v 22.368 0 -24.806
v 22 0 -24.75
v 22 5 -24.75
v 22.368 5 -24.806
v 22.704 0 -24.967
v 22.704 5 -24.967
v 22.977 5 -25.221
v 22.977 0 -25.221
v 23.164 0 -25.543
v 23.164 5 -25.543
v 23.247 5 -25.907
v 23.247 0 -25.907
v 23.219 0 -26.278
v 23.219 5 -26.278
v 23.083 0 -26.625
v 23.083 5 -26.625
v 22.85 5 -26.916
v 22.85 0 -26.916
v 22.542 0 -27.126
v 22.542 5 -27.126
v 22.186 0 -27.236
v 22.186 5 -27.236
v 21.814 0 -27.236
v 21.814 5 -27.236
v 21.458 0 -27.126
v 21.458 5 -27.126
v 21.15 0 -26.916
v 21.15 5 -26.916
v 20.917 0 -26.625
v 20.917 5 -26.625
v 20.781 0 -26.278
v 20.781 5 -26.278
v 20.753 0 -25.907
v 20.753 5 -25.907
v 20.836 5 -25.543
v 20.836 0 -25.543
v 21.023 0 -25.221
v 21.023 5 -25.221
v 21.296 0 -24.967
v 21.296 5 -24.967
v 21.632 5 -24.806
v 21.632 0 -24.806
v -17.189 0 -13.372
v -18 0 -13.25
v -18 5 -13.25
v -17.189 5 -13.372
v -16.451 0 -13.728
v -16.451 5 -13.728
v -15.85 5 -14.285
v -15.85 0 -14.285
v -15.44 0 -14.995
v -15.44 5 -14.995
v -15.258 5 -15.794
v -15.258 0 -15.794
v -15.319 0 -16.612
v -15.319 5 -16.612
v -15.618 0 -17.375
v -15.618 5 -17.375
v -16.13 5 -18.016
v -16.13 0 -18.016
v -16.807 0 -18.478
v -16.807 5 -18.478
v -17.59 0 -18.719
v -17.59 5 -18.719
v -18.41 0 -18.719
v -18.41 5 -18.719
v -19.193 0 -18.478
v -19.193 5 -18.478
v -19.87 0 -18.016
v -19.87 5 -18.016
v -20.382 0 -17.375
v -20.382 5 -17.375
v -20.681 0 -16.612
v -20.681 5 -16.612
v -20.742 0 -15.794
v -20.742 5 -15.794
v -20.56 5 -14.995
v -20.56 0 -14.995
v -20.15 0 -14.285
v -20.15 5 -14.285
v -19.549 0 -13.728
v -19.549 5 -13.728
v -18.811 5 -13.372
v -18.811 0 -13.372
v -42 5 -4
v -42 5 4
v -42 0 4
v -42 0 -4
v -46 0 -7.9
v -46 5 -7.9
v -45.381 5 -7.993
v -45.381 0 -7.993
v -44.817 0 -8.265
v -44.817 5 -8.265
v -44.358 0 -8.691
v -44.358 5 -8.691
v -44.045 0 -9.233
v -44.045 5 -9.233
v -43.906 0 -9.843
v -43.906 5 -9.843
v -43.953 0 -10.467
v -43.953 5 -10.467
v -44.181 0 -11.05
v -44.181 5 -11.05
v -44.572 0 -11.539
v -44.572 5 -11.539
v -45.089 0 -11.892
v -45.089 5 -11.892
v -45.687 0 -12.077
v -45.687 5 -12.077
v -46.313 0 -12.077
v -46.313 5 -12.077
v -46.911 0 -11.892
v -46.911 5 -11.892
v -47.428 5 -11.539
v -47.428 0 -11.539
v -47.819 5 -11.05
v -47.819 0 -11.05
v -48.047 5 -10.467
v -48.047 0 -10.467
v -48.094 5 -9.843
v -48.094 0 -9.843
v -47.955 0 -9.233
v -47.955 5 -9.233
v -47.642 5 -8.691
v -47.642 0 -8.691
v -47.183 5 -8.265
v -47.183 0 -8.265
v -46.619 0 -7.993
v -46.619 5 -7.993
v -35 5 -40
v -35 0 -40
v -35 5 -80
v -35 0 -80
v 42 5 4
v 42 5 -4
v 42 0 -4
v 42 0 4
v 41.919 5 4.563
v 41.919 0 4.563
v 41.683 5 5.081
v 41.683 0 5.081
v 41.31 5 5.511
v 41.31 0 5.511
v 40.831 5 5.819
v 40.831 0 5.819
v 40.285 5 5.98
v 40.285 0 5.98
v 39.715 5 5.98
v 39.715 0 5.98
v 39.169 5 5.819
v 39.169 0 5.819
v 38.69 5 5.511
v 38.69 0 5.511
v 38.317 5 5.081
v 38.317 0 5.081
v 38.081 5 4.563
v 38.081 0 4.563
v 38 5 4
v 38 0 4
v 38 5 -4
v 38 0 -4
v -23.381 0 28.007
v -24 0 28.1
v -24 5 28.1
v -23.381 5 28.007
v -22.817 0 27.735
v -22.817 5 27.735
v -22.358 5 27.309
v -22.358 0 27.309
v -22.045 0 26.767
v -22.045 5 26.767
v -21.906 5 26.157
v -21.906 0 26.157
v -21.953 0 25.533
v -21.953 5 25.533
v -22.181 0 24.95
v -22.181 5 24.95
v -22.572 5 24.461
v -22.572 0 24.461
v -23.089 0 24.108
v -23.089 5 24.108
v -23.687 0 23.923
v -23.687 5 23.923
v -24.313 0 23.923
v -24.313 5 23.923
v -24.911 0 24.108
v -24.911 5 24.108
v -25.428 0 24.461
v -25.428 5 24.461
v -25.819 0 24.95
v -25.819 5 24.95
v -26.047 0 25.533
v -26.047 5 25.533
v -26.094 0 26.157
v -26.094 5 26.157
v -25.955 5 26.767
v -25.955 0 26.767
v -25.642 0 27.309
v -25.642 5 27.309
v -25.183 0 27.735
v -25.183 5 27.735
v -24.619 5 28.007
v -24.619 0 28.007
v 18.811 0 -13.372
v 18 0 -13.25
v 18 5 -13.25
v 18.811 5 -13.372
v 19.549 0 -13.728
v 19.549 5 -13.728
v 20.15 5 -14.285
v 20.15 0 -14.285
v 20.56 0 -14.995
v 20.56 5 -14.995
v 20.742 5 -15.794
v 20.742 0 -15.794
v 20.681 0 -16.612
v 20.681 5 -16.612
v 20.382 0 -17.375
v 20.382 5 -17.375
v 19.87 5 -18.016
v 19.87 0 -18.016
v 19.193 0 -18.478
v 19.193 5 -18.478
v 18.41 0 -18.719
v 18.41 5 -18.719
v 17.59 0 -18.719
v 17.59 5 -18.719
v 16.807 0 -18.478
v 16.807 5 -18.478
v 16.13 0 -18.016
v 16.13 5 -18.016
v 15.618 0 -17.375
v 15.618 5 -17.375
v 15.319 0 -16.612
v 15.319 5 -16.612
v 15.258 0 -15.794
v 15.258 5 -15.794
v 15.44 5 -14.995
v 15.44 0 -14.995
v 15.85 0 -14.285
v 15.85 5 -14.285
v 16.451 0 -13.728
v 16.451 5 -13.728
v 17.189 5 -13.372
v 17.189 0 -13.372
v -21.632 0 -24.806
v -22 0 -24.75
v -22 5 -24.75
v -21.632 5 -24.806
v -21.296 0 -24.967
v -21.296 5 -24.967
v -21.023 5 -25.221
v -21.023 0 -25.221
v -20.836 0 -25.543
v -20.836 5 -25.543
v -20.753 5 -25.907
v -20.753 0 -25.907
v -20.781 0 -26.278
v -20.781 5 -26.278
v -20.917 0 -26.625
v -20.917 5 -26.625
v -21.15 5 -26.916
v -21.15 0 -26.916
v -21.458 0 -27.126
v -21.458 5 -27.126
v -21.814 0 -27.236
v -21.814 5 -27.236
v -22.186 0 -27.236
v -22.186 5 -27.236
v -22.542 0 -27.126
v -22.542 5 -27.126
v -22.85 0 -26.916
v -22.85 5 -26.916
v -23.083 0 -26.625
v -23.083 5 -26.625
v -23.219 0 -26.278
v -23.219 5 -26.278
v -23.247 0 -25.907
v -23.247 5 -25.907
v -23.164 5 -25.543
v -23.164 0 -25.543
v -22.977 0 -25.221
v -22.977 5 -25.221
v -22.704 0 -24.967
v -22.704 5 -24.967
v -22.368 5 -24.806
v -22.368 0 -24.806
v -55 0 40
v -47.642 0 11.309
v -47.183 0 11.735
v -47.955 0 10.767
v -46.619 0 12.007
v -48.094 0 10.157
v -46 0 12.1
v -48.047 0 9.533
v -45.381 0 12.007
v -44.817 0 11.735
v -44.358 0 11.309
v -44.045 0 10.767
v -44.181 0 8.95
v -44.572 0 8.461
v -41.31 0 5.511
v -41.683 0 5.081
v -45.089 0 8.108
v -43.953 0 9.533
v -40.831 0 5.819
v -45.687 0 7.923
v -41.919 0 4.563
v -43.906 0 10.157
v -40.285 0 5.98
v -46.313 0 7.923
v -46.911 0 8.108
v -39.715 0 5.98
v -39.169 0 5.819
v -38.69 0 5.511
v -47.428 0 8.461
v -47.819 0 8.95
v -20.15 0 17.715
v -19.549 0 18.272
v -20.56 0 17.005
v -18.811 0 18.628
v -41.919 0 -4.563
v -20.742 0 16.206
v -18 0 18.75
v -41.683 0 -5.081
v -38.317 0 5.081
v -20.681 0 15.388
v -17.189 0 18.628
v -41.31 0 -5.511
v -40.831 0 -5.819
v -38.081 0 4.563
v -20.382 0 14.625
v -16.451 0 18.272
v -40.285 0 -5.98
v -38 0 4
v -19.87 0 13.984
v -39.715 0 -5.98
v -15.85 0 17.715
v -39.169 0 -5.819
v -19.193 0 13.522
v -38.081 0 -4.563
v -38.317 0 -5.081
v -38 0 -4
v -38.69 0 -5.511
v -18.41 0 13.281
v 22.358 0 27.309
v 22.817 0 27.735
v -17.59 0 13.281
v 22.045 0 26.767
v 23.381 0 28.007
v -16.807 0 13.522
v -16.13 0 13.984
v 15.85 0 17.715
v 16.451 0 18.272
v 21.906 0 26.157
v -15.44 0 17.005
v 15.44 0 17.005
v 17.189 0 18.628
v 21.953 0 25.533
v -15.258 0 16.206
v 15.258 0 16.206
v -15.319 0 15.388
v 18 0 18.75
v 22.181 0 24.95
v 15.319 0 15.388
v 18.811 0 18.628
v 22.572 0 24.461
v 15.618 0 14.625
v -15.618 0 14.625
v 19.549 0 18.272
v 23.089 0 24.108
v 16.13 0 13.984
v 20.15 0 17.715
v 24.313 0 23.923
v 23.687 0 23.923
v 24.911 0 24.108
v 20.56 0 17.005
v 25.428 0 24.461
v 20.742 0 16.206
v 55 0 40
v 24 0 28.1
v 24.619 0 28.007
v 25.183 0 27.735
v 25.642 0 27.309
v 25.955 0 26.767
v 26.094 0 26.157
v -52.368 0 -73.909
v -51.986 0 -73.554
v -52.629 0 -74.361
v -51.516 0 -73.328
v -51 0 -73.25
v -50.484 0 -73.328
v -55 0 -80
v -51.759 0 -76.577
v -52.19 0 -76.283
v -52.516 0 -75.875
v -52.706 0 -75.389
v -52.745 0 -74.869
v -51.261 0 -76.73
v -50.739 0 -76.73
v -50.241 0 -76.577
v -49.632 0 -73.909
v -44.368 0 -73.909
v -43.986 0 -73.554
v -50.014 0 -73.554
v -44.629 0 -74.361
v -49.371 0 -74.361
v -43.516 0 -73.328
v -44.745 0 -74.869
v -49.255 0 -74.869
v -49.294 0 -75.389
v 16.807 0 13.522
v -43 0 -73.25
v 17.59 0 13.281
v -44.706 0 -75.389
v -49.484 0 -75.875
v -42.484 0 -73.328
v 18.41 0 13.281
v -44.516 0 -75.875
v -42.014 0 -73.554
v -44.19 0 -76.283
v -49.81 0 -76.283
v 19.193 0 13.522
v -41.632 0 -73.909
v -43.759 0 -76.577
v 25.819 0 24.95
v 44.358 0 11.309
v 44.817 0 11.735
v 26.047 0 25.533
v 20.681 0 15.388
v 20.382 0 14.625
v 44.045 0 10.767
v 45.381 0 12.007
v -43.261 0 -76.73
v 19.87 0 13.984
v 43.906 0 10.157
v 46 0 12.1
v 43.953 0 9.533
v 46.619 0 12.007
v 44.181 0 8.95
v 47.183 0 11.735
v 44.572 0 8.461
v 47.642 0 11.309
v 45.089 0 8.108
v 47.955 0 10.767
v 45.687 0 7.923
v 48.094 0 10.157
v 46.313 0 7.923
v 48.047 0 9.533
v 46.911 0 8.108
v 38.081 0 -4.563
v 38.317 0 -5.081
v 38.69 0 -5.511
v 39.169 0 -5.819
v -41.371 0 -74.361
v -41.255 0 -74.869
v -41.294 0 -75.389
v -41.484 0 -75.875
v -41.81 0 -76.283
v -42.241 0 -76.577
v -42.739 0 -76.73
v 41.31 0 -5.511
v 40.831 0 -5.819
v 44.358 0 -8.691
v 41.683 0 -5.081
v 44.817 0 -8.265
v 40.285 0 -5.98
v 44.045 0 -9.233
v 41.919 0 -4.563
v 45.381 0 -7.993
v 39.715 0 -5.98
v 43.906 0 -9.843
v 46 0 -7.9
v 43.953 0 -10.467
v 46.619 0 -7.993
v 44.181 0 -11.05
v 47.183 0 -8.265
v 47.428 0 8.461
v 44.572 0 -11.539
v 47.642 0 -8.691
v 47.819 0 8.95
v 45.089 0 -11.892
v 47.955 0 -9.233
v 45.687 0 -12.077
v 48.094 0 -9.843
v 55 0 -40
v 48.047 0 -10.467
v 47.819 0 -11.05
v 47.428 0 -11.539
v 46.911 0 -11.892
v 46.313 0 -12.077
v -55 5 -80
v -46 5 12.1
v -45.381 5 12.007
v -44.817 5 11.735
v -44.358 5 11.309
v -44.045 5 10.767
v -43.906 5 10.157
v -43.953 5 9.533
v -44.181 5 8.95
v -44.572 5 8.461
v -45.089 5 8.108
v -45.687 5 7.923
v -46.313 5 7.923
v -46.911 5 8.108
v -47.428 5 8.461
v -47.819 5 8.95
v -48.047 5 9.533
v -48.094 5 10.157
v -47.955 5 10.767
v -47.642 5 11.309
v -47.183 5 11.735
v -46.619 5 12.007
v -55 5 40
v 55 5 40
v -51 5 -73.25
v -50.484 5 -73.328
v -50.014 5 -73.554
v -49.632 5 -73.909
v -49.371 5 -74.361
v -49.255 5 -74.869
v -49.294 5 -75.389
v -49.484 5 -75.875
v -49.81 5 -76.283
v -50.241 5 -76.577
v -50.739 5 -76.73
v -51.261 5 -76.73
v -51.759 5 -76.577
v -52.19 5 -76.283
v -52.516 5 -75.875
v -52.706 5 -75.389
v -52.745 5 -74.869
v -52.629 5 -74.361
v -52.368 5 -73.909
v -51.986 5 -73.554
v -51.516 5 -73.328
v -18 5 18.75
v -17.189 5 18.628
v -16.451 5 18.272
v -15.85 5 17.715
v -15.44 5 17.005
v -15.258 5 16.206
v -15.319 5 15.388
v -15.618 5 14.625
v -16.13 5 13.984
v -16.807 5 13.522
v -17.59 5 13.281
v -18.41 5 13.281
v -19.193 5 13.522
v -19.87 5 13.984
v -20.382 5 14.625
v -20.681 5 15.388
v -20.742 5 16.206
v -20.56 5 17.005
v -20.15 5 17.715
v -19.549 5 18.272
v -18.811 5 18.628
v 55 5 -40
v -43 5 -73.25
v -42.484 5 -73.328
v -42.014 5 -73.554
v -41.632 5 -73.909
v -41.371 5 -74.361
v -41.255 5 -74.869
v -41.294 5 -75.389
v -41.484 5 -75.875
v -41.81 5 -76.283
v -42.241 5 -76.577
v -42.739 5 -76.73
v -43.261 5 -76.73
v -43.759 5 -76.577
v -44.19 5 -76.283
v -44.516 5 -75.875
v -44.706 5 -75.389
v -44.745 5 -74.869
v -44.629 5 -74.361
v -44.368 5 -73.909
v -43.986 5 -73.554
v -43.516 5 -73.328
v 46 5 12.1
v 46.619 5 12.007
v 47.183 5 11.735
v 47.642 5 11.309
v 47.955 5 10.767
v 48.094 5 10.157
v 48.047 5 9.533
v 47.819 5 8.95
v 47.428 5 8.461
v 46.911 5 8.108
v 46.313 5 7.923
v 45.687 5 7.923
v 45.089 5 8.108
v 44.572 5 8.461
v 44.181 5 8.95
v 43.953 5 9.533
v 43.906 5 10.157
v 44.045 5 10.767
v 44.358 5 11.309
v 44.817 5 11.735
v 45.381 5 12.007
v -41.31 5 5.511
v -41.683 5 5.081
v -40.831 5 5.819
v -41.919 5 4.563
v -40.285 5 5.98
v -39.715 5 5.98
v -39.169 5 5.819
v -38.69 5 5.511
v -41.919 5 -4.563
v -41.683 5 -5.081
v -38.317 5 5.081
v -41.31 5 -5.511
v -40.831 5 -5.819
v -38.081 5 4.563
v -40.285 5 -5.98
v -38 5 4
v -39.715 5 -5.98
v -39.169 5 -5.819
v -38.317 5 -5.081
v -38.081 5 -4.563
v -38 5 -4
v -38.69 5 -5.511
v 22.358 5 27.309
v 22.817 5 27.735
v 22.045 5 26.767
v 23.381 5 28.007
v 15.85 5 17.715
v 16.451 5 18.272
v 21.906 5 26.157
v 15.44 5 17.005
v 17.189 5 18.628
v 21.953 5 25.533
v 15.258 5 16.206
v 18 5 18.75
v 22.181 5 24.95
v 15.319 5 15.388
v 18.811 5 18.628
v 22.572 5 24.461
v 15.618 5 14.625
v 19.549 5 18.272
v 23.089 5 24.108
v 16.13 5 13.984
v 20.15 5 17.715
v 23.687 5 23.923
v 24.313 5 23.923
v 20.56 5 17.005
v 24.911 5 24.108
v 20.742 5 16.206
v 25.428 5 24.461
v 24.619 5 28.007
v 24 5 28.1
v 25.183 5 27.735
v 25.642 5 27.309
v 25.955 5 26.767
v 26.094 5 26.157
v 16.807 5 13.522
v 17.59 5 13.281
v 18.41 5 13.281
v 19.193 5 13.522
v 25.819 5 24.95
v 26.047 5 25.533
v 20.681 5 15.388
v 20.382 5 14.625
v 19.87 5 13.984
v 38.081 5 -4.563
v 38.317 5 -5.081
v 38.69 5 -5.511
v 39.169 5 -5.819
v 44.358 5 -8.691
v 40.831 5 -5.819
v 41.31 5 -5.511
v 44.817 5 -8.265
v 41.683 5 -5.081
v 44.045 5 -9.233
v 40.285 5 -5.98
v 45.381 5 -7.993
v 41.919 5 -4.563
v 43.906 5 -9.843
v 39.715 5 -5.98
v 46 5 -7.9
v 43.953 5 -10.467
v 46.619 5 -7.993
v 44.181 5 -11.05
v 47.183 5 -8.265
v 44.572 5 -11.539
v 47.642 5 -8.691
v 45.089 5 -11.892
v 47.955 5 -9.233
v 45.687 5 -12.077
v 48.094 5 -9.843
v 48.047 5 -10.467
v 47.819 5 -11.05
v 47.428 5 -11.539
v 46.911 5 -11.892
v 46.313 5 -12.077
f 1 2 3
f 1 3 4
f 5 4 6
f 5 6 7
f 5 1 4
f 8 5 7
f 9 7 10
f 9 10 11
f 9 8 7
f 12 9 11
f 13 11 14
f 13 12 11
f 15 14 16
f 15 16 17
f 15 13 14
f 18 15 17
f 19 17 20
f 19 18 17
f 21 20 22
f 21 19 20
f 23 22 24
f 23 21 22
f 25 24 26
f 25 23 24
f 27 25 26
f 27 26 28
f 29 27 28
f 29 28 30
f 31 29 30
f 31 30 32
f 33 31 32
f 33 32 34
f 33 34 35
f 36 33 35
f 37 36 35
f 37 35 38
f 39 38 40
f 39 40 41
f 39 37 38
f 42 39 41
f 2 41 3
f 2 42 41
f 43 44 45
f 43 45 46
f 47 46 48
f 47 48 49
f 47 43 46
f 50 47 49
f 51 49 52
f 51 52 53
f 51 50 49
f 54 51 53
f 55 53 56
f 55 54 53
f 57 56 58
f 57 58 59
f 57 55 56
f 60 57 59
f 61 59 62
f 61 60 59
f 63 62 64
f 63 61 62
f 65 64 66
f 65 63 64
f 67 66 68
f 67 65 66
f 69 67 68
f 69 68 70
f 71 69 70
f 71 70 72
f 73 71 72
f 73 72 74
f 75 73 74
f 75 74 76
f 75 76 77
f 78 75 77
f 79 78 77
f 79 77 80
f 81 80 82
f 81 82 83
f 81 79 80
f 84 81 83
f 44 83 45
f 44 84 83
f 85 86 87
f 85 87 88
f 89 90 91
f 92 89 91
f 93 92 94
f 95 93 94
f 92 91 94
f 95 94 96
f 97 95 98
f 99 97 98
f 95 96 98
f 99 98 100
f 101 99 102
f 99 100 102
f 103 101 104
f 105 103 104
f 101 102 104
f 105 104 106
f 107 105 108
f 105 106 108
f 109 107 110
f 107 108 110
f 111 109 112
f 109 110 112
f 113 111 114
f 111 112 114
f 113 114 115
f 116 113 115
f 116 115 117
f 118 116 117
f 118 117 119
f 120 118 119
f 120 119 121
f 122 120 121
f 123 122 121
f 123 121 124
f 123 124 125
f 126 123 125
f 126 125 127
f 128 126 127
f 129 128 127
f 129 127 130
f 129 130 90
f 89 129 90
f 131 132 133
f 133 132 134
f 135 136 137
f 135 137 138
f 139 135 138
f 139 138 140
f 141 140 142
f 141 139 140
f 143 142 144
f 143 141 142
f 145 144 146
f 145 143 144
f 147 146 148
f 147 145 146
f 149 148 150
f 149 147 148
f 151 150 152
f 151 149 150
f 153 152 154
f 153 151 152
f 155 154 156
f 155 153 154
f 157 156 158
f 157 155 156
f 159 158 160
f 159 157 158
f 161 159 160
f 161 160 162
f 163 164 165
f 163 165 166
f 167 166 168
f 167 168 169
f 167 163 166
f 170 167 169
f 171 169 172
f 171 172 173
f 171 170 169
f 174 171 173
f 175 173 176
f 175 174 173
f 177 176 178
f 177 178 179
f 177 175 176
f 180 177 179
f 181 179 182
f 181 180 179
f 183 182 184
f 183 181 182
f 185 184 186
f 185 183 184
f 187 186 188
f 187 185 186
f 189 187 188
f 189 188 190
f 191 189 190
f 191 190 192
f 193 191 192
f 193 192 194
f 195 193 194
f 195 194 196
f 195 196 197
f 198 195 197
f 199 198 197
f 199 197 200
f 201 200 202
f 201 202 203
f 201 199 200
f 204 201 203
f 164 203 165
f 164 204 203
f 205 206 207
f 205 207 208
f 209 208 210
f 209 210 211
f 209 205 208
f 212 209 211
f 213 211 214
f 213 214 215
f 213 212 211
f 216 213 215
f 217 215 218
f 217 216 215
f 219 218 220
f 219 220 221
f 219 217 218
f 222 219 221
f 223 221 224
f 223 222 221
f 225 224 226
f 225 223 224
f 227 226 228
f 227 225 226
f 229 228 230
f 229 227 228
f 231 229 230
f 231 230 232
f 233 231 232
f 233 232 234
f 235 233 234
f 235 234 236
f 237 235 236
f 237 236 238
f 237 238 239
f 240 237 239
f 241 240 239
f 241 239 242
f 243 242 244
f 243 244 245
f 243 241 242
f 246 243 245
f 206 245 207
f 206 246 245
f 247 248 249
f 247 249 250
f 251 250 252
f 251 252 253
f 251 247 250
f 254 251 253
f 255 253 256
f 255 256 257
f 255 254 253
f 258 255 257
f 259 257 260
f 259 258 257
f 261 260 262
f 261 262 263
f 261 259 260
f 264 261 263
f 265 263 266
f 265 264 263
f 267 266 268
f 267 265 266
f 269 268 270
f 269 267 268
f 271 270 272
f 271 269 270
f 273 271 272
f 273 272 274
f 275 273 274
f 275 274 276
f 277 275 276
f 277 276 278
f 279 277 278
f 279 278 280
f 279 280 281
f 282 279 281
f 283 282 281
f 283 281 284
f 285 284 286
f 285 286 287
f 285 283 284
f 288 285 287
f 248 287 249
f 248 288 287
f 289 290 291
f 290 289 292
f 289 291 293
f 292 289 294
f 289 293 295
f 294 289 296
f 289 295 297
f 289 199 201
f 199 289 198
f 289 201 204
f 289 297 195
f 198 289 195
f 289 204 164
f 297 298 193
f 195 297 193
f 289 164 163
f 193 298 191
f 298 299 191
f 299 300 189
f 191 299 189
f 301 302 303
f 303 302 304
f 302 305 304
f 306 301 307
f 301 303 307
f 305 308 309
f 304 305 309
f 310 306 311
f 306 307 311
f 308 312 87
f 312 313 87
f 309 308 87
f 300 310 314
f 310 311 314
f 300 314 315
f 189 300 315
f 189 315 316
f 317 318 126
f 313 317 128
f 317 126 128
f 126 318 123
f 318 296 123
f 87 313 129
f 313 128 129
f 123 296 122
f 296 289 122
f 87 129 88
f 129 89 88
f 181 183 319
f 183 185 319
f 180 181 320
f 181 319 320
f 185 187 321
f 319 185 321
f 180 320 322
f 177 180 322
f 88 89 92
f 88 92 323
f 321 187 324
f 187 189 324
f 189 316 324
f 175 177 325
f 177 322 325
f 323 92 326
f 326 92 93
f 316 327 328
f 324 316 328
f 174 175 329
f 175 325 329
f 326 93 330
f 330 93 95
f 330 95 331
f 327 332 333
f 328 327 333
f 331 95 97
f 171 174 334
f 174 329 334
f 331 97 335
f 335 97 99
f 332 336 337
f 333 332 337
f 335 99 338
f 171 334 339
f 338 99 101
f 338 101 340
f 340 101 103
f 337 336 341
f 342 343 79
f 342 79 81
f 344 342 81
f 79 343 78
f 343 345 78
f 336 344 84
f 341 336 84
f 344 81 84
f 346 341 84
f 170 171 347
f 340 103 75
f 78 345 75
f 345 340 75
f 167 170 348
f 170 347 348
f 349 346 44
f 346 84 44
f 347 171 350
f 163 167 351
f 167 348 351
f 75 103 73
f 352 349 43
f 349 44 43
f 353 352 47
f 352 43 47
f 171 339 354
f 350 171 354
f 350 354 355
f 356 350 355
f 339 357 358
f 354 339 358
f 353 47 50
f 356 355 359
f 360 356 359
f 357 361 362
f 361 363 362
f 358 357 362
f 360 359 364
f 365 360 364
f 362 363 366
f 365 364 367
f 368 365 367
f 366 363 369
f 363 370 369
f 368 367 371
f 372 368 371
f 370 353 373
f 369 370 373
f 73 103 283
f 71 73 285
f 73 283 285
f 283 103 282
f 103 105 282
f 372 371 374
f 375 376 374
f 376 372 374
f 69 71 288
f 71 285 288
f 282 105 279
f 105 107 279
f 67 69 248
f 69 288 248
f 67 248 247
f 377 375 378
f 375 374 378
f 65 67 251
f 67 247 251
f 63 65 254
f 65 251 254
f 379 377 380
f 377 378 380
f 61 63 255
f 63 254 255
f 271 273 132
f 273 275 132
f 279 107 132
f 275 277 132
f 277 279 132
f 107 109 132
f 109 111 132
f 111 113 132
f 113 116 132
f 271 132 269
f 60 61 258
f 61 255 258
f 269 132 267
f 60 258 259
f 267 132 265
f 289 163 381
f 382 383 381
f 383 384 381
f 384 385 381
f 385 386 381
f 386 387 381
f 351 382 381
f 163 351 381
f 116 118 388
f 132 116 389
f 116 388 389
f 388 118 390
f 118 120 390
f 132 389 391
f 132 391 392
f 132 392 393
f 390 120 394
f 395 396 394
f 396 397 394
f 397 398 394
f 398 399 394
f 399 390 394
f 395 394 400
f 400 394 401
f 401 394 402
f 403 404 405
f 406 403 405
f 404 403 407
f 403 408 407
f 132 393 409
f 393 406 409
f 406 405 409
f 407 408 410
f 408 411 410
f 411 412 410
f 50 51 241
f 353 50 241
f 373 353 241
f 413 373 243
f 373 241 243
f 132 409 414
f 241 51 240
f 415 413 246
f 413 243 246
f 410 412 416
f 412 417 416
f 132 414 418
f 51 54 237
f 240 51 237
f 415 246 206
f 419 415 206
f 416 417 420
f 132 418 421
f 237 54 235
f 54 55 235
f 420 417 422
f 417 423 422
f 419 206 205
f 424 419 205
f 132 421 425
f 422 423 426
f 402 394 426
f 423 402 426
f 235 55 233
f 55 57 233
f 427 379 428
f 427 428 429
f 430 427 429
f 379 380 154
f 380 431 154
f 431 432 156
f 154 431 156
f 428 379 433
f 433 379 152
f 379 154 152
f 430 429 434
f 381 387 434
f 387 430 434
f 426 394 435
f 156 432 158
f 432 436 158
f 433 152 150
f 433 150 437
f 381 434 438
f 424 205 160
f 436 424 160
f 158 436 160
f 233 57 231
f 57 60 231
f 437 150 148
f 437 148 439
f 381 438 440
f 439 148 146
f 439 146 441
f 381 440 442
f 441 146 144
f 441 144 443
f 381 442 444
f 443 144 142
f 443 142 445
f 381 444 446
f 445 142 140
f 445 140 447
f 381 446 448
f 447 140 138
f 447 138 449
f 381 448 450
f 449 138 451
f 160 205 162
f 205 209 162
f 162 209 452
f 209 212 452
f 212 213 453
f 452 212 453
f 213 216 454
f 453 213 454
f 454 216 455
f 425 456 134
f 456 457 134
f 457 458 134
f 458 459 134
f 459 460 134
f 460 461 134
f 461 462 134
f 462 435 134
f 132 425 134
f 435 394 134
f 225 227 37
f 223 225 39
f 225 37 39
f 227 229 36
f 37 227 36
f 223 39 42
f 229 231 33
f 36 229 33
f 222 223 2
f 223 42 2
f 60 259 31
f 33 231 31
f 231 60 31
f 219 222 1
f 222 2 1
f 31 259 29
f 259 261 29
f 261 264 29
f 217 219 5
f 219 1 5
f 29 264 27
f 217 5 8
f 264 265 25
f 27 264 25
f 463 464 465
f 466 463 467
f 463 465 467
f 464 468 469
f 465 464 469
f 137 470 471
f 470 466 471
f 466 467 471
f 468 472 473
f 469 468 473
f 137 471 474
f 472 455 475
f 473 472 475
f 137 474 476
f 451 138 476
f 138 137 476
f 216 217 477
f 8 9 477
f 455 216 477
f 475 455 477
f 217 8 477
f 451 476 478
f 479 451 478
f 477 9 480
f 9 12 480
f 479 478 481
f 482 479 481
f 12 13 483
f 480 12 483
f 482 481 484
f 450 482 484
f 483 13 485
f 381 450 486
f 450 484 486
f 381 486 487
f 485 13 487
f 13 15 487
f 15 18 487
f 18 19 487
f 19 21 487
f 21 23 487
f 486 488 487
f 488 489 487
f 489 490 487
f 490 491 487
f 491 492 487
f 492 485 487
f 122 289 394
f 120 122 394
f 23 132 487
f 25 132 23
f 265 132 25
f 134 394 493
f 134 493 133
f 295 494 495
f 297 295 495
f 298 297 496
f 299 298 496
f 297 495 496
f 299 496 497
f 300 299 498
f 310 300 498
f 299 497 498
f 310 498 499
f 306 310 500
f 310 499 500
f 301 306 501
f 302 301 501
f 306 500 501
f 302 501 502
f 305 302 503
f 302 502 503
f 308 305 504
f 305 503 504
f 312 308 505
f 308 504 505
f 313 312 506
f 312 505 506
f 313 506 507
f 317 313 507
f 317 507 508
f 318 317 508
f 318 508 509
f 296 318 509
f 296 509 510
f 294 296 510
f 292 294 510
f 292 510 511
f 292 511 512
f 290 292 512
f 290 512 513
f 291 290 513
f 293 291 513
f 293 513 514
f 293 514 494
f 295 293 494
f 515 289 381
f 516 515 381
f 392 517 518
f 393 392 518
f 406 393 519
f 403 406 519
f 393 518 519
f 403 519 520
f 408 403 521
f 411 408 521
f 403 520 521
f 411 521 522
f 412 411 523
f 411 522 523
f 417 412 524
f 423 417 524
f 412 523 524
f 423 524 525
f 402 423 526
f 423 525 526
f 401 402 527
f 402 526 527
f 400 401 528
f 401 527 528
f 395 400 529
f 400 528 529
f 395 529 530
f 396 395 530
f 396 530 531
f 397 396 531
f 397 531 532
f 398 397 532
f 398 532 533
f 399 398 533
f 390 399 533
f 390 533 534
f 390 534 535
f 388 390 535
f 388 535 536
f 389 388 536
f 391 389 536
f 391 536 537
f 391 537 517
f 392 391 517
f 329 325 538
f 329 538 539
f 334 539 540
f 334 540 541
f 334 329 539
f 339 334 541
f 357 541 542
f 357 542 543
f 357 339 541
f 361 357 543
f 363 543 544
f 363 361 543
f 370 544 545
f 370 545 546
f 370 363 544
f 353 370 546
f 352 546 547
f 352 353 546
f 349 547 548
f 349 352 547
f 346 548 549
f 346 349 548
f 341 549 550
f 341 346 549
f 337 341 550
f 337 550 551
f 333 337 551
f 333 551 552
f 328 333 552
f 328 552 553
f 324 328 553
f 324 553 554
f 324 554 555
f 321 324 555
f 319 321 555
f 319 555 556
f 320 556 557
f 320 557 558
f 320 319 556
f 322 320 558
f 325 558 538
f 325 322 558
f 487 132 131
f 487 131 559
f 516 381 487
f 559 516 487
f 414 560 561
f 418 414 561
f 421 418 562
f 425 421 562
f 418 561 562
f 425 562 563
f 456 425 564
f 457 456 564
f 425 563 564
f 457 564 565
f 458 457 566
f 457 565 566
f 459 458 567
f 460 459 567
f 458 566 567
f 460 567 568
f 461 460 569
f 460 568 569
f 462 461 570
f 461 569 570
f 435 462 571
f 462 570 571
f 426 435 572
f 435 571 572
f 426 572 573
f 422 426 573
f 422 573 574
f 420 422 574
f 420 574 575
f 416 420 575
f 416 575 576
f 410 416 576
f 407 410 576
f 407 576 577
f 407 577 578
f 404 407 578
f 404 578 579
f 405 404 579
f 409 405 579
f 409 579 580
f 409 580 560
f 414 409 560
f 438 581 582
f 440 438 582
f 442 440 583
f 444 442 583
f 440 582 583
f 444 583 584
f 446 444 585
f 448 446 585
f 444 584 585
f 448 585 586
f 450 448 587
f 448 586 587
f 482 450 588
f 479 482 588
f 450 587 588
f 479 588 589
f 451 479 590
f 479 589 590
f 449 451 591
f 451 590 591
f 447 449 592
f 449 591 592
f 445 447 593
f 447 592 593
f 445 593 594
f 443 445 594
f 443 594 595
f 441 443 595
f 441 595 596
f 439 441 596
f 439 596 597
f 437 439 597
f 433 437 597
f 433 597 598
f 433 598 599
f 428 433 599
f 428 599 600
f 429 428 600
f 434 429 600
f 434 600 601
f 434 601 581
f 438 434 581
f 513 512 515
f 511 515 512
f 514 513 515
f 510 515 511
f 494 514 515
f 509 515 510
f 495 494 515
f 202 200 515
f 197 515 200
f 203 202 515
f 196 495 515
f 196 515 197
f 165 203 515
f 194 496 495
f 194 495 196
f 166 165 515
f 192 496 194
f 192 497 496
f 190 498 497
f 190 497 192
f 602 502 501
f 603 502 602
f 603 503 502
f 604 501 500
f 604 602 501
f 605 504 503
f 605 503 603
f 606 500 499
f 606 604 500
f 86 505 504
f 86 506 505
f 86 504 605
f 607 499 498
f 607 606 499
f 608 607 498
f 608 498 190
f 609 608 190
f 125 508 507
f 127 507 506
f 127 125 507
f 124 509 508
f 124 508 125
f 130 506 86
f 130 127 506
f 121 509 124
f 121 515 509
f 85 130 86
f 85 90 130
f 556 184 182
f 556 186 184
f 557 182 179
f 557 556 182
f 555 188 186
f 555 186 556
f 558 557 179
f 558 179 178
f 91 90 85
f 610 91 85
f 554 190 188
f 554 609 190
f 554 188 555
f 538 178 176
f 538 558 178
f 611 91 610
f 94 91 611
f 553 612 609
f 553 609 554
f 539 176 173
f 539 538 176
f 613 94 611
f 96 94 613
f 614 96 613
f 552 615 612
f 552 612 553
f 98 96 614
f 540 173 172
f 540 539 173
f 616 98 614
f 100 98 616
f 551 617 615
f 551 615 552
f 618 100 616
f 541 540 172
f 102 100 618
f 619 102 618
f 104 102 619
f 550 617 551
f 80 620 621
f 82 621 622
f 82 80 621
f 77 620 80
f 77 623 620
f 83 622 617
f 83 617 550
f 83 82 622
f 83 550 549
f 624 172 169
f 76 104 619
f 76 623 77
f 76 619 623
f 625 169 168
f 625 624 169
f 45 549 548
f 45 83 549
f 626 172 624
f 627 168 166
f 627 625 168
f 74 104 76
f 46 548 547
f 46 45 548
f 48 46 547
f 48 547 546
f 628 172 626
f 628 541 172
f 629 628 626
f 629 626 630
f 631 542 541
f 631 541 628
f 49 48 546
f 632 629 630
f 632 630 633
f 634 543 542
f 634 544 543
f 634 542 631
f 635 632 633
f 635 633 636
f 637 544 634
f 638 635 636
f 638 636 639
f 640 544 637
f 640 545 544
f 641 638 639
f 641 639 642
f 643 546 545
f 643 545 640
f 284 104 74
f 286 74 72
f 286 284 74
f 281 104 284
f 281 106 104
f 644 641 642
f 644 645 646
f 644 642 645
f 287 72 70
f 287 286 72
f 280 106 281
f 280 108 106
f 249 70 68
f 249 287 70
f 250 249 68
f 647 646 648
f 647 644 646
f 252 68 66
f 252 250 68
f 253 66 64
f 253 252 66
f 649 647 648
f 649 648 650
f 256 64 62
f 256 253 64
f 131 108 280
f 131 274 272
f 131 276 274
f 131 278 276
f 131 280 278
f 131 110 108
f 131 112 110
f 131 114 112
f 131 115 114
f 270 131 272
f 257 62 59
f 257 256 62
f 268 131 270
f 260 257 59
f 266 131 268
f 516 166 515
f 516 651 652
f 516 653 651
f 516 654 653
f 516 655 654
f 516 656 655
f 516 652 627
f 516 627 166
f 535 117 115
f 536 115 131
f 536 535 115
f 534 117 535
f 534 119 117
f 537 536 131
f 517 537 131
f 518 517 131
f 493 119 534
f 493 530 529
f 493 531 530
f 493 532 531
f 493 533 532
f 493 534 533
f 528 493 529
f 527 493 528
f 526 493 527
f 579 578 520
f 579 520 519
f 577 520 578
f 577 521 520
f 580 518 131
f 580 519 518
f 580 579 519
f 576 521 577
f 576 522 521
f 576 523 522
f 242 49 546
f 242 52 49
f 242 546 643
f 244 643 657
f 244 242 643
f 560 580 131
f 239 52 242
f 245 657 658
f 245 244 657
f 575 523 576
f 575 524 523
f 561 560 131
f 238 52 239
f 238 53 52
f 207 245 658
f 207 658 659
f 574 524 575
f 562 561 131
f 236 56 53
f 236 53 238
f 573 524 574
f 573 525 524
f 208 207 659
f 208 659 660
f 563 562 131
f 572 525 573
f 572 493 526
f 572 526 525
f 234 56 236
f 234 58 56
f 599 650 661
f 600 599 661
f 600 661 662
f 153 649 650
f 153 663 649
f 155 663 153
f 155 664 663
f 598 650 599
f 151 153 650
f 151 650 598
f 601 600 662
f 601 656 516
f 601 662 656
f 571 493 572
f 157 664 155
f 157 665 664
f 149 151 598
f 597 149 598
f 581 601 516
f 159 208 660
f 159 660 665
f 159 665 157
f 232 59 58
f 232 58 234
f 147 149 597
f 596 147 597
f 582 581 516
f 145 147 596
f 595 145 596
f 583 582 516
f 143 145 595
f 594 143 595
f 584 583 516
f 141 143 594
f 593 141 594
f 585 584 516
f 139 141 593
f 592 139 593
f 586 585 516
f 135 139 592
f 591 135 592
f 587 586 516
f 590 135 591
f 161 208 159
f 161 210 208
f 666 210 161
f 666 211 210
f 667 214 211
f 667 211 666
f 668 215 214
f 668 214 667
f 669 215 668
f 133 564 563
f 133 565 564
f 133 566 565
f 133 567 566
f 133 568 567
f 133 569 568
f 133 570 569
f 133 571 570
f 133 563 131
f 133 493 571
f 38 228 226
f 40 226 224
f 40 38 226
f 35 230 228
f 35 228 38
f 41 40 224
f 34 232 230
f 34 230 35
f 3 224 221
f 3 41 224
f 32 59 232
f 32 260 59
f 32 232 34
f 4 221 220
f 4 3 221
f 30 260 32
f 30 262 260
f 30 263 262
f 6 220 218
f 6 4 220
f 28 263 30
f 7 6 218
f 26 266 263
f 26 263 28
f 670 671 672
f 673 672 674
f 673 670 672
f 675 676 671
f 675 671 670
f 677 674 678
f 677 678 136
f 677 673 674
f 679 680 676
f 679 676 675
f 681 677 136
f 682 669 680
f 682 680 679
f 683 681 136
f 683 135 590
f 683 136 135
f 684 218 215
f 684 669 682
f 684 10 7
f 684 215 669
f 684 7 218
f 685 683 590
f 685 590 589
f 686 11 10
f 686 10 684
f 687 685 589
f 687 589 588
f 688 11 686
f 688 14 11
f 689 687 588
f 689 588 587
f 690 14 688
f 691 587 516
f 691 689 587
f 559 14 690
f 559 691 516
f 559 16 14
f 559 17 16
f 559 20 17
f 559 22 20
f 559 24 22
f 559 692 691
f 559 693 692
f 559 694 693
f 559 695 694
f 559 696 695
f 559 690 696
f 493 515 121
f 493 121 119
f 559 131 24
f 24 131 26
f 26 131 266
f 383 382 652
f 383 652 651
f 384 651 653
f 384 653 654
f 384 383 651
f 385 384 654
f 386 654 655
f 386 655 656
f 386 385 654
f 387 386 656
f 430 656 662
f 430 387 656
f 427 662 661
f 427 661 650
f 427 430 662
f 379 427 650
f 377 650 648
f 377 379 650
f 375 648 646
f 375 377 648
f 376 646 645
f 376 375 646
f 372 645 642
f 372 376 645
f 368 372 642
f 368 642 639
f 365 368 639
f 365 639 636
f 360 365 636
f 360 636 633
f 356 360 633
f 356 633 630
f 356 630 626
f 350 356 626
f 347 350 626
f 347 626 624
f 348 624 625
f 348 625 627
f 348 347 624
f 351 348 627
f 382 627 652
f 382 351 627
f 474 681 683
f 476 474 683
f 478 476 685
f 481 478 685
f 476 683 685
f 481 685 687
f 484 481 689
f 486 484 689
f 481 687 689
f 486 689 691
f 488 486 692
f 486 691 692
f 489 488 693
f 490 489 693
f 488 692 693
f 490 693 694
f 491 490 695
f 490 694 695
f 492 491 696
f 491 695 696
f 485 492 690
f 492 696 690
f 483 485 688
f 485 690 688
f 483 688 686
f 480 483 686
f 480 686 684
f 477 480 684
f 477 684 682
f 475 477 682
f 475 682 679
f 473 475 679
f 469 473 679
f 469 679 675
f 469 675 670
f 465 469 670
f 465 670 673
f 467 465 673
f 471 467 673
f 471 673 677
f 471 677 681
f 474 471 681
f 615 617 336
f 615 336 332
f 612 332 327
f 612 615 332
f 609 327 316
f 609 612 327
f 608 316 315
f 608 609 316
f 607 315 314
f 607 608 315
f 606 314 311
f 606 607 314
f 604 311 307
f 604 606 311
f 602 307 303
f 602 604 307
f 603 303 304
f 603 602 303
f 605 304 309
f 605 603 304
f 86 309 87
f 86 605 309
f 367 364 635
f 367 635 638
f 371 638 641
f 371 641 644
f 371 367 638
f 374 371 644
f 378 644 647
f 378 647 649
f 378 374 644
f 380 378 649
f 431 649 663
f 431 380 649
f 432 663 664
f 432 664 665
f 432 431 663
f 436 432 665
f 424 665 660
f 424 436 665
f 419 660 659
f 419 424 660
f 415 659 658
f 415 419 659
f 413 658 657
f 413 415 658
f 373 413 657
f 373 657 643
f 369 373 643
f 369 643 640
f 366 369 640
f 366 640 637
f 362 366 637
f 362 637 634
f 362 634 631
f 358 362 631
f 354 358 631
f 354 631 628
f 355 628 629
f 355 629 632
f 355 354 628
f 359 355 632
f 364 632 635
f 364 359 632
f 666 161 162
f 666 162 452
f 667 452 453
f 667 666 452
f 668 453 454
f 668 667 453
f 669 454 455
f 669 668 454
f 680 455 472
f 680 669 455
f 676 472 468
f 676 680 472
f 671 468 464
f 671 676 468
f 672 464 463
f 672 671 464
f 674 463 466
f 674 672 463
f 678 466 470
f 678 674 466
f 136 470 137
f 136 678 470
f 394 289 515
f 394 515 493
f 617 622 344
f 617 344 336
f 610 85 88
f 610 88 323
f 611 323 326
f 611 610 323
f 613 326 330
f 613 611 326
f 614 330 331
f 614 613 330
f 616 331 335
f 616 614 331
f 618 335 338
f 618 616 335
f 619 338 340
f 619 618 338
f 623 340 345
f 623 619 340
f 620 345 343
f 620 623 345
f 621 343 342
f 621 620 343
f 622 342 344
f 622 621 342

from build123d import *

# Parameters (mm, degrees)
SKETCH1_W           = 110
SKETCH1_H           = 80
SKETCH1_R           = 2.75
SKETCH1_R_2         = 1.25
SKETCH1_R_3         = 2.1
BOSS_EXTRUDE1_DEPTH = 5
SKETCH2_R           = 2.1
CUT_EXTRUDE1_DEPTH  = 69.190908485
SKETCH7_W           = 20
SKETCH7_H           = 40
BOSS_EXTRUDE2_DEPTH = 5
CUT_EXTRUDE2_REACH  = 99.211
SKETCH8_R           = 1.75


with BuildPart() as part:
    # Sketch1 → Boss-Extrude1 (new body)
    with BuildSketch(Plane(origin=(0, 0, 0), x_dir=(1, 0, 0), z_dir=(0, 1, 0))):
        Rectangle(SKETCH1_W, SKETCH1_H)
        with Locations(Location((-18, 16, 0), (0, 0, 270))):
            Circle(SKETCH1_R, mode=Mode.SUBTRACT)
        with Locations(Location((18, 16, 0), (0, 0, 270))):
            Circle(SKETCH1_R, mode=Mode.SUBTRACT)
        with Locations(Location((18, -16, 0), (0, 0, 270))):
            Circle(SKETCH1_R, mode=Mode.SUBTRACT)
        with Locations(Location((-18, -16, 0), (0, 0, 270))):
            Circle(SKETCH1_R, mode=Mode.SUBTRACT)
        with Locations(Location((-22, 26, 0), (0, 0, 270))):
            Circle(SKETCH1_R_2, mode=Mode.SUBTRACT)
        with Locations(Location((22, 26, 0), (0, 0, 270))):
            Circle(SKETCH1_R_2, mode=Mode.SUBTRACT)
        with Locations(Location((-24, -26, 0), (0, 0, 270))):
            Circle(SKETCH1_R_3, mode=Mode.SUBTRACT)
        with Locations(Location((24, -26, 0), (0, 0, 270))):
            Circle(SKETCH1_R_3, mode=Mode.SUBTRACT)
    extrude(amount=BOSS_EXTRUDE1_DEPTH)

    # Sketch2 → Cut-Extrude1 (cut, through all)
    with BuildSketch(Plane(origin=(0, 5, 0), x_dir=(1, 0, 0), z_dir=(0, 1, 0))):
        with Locations(Location((-46, 10, 0), (0, 0, 270))):
            Circle(SKETCH2_R)
        with Locations(Location((-46, -10, 0), (0, 0, 270))):
            Circle(SKETCH2_R)
        with Locations(Location((46, -10, 0), (0, 0, 270))):
            Circle(SKETCH2_R)
        with Locations(Location((46, 10, 0), (0, 0, 270))):
            Circle(SKETCH2_R)
        with BuildLine():
            Line((-38, 4), (-38, -4))
            ThreePointArc((-38, -4), (-40, -6), (-42, -4))
            Line((-42, -4), (-42, 4))
            ThreePointArc((-42, 4), (-40, 6), (-38, 4))
        make_face()
        with BuildLine():
            Line((42, 4), (42, -4))
            ThreePointArc((42, -4), (40, -6), (38, -4))
            Line((38, -4), (38, 4))
            ThreePointArc((38, 4), (40, 6), (42, 4))
        make_face()
    extrude(amount=-CUT_EXTRUDE1_DEPTH, mode=Mode.SUBTRACT)

    # Sketch7 → Boss-Extrude2 (add)
    with BuildSketch(Plane(origin=(0, 0, 0), x_dir=(1, 0, 0), z_dir=(0, 1, 0))):
        with Locations((-45, 60)):
            Rectangle(SKETCH7_W, SKETCH7_H)
    extrude(amount=BOSS_EXTRUDE2_DEPTH)

    # Sketch8 → Cut-Extrude2 (cut, up to next)
    with BuildSketch(Plane(origin=(0, 5, 0), x_dir=(1, 0, 0), z_dir=(0, 1, 0)), mode=Mode.PRIVATE) as cut_extrude2_sk1:
        with Locations(Location((-51, 75, 0), (0, 0, 270))):
            Circle(SKETCH8_R)
    cut_extrude2_tool1 = extrude(cut_extrude2_sk1.sketch, amount=-CUT_EXTRUDE2_REACH, mode=Mode.PRIVATE) & part.part
    # Sketch8 → Cut-Extrude2 (cut, up to next)
    with BuildSketch(Plane(origin=(0, 5, 0), x_dir=(1, 0, 0), z_dir=(0, 1, 0)), mode=Mode.PRIVATE) as cut_extrude2_sk2:
        with Locations(Location((-43, 75, 0), (0, 0, 270))):
            Circle(SKETCH8_R)
    cut_extrude2_tool2 = extrude(cut_extrude2_sk2.sketch, amount=-CUT_EXTRUDE2_REACH, mode=Mode.PRIVATE) & part.part
    add(cut_extrude2_tool1.solids().sort_by_distance((-51, 5, -75))[0], mode=Mode.SUBTRACT)
    add(cut_extrude2_tool2.solids().sort_by_distance((-43, 5, -75))[0], mode=Mode.SUBTRACT)


solid = part.part
